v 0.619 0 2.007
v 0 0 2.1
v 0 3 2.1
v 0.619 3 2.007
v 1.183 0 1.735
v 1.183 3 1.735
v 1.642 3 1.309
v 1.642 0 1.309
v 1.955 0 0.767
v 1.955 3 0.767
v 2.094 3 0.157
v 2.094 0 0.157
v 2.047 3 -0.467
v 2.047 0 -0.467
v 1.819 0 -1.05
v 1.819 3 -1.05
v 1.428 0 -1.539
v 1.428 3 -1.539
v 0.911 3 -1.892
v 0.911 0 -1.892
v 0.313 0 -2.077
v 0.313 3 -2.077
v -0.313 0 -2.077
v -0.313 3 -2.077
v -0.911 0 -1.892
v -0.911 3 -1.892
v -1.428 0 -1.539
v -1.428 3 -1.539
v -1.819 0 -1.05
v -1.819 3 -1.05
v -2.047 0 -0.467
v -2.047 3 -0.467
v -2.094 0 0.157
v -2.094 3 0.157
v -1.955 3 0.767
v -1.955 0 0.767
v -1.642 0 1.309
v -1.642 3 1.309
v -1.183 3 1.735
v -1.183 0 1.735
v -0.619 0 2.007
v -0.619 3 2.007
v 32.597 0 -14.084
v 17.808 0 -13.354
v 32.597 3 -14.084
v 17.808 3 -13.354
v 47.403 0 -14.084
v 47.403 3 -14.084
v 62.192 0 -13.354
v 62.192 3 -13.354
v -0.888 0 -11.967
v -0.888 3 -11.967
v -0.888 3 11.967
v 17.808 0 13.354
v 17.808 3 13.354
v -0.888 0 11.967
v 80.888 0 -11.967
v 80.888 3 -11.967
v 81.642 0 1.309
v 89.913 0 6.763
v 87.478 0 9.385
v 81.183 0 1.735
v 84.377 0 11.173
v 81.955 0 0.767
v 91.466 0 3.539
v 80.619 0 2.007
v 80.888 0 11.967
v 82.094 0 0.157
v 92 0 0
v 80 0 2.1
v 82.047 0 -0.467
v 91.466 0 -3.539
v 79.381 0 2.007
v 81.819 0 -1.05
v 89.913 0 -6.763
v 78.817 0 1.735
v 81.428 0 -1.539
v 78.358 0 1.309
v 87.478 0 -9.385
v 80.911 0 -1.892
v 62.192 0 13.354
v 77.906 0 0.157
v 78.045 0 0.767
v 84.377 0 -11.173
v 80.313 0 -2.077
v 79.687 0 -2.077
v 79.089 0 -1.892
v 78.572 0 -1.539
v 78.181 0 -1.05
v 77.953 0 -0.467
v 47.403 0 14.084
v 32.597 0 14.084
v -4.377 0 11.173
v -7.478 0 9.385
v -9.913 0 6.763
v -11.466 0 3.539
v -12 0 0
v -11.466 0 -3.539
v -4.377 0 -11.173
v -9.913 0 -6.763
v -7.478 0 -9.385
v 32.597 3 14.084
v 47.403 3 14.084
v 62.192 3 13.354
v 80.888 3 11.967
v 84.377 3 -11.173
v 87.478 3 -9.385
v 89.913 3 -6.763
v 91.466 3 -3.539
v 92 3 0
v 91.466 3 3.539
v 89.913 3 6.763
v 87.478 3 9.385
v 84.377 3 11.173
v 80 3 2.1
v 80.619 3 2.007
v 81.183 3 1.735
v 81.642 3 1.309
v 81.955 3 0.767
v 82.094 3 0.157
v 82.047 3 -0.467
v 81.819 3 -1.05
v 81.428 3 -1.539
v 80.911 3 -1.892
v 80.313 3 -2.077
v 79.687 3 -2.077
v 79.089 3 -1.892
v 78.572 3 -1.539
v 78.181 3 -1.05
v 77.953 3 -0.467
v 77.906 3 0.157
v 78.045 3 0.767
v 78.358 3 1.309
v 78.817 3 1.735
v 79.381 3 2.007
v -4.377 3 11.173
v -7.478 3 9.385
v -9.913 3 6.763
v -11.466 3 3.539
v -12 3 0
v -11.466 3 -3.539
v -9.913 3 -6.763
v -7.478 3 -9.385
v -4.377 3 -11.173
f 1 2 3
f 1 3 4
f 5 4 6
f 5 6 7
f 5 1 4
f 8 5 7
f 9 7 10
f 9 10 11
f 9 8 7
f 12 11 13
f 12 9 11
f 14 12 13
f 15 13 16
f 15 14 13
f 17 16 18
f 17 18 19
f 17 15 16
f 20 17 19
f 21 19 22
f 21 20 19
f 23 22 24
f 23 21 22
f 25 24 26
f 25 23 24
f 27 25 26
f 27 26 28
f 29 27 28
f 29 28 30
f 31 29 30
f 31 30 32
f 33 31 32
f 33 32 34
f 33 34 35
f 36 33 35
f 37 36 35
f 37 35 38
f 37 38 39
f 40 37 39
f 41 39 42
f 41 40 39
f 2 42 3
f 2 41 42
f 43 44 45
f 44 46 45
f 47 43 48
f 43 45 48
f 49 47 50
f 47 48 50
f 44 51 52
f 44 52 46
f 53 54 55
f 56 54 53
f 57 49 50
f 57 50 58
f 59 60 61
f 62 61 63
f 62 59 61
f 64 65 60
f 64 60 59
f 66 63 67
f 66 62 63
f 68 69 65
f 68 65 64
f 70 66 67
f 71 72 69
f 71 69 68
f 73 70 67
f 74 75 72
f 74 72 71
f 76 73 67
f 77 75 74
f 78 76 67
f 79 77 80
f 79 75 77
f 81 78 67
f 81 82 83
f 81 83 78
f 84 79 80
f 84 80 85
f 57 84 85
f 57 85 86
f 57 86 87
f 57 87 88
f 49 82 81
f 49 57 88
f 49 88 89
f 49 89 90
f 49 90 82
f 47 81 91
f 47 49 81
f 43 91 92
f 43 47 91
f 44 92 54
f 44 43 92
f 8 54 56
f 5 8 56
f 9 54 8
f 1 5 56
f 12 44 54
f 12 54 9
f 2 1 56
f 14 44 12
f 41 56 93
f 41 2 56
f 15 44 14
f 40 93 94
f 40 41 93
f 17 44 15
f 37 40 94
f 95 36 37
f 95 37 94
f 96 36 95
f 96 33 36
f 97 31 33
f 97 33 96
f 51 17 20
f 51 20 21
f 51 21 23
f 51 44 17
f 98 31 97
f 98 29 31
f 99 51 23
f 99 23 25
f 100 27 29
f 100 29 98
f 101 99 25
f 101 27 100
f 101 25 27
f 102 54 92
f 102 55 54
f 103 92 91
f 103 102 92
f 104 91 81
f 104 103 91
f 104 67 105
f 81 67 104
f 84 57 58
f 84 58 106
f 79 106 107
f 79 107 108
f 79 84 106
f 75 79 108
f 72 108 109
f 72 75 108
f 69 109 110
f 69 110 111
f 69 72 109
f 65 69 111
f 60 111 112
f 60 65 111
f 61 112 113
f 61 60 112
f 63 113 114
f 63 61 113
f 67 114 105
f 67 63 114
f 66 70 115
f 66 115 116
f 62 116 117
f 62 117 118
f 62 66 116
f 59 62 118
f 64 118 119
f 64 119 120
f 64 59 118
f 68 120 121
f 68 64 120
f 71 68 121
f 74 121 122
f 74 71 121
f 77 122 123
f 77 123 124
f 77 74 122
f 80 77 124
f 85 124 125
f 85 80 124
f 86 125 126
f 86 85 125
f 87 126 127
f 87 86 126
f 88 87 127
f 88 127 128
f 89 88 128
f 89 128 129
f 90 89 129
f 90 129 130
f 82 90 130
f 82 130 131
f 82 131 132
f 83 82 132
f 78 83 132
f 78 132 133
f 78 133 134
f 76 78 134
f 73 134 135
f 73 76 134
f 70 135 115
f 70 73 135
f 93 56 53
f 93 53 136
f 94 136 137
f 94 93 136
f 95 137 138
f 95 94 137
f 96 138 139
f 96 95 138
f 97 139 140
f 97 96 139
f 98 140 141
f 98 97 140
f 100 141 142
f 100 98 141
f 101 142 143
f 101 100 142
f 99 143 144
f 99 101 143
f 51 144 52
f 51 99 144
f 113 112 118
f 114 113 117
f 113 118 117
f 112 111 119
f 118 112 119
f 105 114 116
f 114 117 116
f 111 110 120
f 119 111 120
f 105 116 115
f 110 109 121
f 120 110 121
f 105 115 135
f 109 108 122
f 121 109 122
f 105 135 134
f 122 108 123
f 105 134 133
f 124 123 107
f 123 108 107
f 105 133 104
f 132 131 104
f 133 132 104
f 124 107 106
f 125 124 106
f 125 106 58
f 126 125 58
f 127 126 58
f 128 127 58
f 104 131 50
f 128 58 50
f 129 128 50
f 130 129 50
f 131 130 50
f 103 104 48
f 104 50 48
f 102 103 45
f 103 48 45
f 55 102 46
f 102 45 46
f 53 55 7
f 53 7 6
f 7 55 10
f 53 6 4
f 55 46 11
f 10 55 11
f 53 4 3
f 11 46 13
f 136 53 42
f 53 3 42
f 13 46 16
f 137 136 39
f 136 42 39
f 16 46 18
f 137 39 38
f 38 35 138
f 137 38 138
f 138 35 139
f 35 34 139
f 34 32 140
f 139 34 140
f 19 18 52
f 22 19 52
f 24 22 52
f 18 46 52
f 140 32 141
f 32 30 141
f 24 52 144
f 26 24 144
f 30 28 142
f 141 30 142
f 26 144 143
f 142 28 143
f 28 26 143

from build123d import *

# Parameters (mm, degrees)
SKETCH_1_R      = 2.1
EXTRUDE_1_DEPTH = 3
FILLET_1_R      = 300


with BuildPart() as part:
    # 草图1 → 凸台-拉伸1 (new body)
    with BuildSketch(Plane(origin=(0, 0, 0), x_dir=(1, 0, 0), z_dir=(0, 1, 0))):
        with BuildLine():
            Line((-0.887671233, 11.967123288), (40, 15))
            Line((40, 15), (80.887671233, 11.967123288))
            ThreePointArc((80.887671233, 11.967123288), (92, 0), (80.887671233, -11.967123288))
            Line((80.887671233, -11.967123288), (40, -15))
            Line((40, -15), (-0.887671233, -11.967123288))
            ThreePointArc((-0.887671233, -11.967123288), (-12, 0), (-0.887671233, 11.967123288))
        make_face()
        with Locations(Location((0, 0, 0), (0, 0, 270))):
            Circle(SKETCH_1_R, mode=Mode.SUBTRACT)
        with Locations(Location((80, 0, 0), (0, 0, 270))):
            Circle(SKETCH_1_R, mode=Mode.SUBTRACT)
    extrude(amount=EXTRUDE_1_DEPTH)

    # 圆角1
    fillet_1_edges = [part.edges().sort_by_distance(p)[0] for p in [
        (40, 1.5, 15),
        (40, 1.5, -15),
    ]]
    fillet(fillet_1_edges, radius=FILLET_1_R)


solid = part.part
